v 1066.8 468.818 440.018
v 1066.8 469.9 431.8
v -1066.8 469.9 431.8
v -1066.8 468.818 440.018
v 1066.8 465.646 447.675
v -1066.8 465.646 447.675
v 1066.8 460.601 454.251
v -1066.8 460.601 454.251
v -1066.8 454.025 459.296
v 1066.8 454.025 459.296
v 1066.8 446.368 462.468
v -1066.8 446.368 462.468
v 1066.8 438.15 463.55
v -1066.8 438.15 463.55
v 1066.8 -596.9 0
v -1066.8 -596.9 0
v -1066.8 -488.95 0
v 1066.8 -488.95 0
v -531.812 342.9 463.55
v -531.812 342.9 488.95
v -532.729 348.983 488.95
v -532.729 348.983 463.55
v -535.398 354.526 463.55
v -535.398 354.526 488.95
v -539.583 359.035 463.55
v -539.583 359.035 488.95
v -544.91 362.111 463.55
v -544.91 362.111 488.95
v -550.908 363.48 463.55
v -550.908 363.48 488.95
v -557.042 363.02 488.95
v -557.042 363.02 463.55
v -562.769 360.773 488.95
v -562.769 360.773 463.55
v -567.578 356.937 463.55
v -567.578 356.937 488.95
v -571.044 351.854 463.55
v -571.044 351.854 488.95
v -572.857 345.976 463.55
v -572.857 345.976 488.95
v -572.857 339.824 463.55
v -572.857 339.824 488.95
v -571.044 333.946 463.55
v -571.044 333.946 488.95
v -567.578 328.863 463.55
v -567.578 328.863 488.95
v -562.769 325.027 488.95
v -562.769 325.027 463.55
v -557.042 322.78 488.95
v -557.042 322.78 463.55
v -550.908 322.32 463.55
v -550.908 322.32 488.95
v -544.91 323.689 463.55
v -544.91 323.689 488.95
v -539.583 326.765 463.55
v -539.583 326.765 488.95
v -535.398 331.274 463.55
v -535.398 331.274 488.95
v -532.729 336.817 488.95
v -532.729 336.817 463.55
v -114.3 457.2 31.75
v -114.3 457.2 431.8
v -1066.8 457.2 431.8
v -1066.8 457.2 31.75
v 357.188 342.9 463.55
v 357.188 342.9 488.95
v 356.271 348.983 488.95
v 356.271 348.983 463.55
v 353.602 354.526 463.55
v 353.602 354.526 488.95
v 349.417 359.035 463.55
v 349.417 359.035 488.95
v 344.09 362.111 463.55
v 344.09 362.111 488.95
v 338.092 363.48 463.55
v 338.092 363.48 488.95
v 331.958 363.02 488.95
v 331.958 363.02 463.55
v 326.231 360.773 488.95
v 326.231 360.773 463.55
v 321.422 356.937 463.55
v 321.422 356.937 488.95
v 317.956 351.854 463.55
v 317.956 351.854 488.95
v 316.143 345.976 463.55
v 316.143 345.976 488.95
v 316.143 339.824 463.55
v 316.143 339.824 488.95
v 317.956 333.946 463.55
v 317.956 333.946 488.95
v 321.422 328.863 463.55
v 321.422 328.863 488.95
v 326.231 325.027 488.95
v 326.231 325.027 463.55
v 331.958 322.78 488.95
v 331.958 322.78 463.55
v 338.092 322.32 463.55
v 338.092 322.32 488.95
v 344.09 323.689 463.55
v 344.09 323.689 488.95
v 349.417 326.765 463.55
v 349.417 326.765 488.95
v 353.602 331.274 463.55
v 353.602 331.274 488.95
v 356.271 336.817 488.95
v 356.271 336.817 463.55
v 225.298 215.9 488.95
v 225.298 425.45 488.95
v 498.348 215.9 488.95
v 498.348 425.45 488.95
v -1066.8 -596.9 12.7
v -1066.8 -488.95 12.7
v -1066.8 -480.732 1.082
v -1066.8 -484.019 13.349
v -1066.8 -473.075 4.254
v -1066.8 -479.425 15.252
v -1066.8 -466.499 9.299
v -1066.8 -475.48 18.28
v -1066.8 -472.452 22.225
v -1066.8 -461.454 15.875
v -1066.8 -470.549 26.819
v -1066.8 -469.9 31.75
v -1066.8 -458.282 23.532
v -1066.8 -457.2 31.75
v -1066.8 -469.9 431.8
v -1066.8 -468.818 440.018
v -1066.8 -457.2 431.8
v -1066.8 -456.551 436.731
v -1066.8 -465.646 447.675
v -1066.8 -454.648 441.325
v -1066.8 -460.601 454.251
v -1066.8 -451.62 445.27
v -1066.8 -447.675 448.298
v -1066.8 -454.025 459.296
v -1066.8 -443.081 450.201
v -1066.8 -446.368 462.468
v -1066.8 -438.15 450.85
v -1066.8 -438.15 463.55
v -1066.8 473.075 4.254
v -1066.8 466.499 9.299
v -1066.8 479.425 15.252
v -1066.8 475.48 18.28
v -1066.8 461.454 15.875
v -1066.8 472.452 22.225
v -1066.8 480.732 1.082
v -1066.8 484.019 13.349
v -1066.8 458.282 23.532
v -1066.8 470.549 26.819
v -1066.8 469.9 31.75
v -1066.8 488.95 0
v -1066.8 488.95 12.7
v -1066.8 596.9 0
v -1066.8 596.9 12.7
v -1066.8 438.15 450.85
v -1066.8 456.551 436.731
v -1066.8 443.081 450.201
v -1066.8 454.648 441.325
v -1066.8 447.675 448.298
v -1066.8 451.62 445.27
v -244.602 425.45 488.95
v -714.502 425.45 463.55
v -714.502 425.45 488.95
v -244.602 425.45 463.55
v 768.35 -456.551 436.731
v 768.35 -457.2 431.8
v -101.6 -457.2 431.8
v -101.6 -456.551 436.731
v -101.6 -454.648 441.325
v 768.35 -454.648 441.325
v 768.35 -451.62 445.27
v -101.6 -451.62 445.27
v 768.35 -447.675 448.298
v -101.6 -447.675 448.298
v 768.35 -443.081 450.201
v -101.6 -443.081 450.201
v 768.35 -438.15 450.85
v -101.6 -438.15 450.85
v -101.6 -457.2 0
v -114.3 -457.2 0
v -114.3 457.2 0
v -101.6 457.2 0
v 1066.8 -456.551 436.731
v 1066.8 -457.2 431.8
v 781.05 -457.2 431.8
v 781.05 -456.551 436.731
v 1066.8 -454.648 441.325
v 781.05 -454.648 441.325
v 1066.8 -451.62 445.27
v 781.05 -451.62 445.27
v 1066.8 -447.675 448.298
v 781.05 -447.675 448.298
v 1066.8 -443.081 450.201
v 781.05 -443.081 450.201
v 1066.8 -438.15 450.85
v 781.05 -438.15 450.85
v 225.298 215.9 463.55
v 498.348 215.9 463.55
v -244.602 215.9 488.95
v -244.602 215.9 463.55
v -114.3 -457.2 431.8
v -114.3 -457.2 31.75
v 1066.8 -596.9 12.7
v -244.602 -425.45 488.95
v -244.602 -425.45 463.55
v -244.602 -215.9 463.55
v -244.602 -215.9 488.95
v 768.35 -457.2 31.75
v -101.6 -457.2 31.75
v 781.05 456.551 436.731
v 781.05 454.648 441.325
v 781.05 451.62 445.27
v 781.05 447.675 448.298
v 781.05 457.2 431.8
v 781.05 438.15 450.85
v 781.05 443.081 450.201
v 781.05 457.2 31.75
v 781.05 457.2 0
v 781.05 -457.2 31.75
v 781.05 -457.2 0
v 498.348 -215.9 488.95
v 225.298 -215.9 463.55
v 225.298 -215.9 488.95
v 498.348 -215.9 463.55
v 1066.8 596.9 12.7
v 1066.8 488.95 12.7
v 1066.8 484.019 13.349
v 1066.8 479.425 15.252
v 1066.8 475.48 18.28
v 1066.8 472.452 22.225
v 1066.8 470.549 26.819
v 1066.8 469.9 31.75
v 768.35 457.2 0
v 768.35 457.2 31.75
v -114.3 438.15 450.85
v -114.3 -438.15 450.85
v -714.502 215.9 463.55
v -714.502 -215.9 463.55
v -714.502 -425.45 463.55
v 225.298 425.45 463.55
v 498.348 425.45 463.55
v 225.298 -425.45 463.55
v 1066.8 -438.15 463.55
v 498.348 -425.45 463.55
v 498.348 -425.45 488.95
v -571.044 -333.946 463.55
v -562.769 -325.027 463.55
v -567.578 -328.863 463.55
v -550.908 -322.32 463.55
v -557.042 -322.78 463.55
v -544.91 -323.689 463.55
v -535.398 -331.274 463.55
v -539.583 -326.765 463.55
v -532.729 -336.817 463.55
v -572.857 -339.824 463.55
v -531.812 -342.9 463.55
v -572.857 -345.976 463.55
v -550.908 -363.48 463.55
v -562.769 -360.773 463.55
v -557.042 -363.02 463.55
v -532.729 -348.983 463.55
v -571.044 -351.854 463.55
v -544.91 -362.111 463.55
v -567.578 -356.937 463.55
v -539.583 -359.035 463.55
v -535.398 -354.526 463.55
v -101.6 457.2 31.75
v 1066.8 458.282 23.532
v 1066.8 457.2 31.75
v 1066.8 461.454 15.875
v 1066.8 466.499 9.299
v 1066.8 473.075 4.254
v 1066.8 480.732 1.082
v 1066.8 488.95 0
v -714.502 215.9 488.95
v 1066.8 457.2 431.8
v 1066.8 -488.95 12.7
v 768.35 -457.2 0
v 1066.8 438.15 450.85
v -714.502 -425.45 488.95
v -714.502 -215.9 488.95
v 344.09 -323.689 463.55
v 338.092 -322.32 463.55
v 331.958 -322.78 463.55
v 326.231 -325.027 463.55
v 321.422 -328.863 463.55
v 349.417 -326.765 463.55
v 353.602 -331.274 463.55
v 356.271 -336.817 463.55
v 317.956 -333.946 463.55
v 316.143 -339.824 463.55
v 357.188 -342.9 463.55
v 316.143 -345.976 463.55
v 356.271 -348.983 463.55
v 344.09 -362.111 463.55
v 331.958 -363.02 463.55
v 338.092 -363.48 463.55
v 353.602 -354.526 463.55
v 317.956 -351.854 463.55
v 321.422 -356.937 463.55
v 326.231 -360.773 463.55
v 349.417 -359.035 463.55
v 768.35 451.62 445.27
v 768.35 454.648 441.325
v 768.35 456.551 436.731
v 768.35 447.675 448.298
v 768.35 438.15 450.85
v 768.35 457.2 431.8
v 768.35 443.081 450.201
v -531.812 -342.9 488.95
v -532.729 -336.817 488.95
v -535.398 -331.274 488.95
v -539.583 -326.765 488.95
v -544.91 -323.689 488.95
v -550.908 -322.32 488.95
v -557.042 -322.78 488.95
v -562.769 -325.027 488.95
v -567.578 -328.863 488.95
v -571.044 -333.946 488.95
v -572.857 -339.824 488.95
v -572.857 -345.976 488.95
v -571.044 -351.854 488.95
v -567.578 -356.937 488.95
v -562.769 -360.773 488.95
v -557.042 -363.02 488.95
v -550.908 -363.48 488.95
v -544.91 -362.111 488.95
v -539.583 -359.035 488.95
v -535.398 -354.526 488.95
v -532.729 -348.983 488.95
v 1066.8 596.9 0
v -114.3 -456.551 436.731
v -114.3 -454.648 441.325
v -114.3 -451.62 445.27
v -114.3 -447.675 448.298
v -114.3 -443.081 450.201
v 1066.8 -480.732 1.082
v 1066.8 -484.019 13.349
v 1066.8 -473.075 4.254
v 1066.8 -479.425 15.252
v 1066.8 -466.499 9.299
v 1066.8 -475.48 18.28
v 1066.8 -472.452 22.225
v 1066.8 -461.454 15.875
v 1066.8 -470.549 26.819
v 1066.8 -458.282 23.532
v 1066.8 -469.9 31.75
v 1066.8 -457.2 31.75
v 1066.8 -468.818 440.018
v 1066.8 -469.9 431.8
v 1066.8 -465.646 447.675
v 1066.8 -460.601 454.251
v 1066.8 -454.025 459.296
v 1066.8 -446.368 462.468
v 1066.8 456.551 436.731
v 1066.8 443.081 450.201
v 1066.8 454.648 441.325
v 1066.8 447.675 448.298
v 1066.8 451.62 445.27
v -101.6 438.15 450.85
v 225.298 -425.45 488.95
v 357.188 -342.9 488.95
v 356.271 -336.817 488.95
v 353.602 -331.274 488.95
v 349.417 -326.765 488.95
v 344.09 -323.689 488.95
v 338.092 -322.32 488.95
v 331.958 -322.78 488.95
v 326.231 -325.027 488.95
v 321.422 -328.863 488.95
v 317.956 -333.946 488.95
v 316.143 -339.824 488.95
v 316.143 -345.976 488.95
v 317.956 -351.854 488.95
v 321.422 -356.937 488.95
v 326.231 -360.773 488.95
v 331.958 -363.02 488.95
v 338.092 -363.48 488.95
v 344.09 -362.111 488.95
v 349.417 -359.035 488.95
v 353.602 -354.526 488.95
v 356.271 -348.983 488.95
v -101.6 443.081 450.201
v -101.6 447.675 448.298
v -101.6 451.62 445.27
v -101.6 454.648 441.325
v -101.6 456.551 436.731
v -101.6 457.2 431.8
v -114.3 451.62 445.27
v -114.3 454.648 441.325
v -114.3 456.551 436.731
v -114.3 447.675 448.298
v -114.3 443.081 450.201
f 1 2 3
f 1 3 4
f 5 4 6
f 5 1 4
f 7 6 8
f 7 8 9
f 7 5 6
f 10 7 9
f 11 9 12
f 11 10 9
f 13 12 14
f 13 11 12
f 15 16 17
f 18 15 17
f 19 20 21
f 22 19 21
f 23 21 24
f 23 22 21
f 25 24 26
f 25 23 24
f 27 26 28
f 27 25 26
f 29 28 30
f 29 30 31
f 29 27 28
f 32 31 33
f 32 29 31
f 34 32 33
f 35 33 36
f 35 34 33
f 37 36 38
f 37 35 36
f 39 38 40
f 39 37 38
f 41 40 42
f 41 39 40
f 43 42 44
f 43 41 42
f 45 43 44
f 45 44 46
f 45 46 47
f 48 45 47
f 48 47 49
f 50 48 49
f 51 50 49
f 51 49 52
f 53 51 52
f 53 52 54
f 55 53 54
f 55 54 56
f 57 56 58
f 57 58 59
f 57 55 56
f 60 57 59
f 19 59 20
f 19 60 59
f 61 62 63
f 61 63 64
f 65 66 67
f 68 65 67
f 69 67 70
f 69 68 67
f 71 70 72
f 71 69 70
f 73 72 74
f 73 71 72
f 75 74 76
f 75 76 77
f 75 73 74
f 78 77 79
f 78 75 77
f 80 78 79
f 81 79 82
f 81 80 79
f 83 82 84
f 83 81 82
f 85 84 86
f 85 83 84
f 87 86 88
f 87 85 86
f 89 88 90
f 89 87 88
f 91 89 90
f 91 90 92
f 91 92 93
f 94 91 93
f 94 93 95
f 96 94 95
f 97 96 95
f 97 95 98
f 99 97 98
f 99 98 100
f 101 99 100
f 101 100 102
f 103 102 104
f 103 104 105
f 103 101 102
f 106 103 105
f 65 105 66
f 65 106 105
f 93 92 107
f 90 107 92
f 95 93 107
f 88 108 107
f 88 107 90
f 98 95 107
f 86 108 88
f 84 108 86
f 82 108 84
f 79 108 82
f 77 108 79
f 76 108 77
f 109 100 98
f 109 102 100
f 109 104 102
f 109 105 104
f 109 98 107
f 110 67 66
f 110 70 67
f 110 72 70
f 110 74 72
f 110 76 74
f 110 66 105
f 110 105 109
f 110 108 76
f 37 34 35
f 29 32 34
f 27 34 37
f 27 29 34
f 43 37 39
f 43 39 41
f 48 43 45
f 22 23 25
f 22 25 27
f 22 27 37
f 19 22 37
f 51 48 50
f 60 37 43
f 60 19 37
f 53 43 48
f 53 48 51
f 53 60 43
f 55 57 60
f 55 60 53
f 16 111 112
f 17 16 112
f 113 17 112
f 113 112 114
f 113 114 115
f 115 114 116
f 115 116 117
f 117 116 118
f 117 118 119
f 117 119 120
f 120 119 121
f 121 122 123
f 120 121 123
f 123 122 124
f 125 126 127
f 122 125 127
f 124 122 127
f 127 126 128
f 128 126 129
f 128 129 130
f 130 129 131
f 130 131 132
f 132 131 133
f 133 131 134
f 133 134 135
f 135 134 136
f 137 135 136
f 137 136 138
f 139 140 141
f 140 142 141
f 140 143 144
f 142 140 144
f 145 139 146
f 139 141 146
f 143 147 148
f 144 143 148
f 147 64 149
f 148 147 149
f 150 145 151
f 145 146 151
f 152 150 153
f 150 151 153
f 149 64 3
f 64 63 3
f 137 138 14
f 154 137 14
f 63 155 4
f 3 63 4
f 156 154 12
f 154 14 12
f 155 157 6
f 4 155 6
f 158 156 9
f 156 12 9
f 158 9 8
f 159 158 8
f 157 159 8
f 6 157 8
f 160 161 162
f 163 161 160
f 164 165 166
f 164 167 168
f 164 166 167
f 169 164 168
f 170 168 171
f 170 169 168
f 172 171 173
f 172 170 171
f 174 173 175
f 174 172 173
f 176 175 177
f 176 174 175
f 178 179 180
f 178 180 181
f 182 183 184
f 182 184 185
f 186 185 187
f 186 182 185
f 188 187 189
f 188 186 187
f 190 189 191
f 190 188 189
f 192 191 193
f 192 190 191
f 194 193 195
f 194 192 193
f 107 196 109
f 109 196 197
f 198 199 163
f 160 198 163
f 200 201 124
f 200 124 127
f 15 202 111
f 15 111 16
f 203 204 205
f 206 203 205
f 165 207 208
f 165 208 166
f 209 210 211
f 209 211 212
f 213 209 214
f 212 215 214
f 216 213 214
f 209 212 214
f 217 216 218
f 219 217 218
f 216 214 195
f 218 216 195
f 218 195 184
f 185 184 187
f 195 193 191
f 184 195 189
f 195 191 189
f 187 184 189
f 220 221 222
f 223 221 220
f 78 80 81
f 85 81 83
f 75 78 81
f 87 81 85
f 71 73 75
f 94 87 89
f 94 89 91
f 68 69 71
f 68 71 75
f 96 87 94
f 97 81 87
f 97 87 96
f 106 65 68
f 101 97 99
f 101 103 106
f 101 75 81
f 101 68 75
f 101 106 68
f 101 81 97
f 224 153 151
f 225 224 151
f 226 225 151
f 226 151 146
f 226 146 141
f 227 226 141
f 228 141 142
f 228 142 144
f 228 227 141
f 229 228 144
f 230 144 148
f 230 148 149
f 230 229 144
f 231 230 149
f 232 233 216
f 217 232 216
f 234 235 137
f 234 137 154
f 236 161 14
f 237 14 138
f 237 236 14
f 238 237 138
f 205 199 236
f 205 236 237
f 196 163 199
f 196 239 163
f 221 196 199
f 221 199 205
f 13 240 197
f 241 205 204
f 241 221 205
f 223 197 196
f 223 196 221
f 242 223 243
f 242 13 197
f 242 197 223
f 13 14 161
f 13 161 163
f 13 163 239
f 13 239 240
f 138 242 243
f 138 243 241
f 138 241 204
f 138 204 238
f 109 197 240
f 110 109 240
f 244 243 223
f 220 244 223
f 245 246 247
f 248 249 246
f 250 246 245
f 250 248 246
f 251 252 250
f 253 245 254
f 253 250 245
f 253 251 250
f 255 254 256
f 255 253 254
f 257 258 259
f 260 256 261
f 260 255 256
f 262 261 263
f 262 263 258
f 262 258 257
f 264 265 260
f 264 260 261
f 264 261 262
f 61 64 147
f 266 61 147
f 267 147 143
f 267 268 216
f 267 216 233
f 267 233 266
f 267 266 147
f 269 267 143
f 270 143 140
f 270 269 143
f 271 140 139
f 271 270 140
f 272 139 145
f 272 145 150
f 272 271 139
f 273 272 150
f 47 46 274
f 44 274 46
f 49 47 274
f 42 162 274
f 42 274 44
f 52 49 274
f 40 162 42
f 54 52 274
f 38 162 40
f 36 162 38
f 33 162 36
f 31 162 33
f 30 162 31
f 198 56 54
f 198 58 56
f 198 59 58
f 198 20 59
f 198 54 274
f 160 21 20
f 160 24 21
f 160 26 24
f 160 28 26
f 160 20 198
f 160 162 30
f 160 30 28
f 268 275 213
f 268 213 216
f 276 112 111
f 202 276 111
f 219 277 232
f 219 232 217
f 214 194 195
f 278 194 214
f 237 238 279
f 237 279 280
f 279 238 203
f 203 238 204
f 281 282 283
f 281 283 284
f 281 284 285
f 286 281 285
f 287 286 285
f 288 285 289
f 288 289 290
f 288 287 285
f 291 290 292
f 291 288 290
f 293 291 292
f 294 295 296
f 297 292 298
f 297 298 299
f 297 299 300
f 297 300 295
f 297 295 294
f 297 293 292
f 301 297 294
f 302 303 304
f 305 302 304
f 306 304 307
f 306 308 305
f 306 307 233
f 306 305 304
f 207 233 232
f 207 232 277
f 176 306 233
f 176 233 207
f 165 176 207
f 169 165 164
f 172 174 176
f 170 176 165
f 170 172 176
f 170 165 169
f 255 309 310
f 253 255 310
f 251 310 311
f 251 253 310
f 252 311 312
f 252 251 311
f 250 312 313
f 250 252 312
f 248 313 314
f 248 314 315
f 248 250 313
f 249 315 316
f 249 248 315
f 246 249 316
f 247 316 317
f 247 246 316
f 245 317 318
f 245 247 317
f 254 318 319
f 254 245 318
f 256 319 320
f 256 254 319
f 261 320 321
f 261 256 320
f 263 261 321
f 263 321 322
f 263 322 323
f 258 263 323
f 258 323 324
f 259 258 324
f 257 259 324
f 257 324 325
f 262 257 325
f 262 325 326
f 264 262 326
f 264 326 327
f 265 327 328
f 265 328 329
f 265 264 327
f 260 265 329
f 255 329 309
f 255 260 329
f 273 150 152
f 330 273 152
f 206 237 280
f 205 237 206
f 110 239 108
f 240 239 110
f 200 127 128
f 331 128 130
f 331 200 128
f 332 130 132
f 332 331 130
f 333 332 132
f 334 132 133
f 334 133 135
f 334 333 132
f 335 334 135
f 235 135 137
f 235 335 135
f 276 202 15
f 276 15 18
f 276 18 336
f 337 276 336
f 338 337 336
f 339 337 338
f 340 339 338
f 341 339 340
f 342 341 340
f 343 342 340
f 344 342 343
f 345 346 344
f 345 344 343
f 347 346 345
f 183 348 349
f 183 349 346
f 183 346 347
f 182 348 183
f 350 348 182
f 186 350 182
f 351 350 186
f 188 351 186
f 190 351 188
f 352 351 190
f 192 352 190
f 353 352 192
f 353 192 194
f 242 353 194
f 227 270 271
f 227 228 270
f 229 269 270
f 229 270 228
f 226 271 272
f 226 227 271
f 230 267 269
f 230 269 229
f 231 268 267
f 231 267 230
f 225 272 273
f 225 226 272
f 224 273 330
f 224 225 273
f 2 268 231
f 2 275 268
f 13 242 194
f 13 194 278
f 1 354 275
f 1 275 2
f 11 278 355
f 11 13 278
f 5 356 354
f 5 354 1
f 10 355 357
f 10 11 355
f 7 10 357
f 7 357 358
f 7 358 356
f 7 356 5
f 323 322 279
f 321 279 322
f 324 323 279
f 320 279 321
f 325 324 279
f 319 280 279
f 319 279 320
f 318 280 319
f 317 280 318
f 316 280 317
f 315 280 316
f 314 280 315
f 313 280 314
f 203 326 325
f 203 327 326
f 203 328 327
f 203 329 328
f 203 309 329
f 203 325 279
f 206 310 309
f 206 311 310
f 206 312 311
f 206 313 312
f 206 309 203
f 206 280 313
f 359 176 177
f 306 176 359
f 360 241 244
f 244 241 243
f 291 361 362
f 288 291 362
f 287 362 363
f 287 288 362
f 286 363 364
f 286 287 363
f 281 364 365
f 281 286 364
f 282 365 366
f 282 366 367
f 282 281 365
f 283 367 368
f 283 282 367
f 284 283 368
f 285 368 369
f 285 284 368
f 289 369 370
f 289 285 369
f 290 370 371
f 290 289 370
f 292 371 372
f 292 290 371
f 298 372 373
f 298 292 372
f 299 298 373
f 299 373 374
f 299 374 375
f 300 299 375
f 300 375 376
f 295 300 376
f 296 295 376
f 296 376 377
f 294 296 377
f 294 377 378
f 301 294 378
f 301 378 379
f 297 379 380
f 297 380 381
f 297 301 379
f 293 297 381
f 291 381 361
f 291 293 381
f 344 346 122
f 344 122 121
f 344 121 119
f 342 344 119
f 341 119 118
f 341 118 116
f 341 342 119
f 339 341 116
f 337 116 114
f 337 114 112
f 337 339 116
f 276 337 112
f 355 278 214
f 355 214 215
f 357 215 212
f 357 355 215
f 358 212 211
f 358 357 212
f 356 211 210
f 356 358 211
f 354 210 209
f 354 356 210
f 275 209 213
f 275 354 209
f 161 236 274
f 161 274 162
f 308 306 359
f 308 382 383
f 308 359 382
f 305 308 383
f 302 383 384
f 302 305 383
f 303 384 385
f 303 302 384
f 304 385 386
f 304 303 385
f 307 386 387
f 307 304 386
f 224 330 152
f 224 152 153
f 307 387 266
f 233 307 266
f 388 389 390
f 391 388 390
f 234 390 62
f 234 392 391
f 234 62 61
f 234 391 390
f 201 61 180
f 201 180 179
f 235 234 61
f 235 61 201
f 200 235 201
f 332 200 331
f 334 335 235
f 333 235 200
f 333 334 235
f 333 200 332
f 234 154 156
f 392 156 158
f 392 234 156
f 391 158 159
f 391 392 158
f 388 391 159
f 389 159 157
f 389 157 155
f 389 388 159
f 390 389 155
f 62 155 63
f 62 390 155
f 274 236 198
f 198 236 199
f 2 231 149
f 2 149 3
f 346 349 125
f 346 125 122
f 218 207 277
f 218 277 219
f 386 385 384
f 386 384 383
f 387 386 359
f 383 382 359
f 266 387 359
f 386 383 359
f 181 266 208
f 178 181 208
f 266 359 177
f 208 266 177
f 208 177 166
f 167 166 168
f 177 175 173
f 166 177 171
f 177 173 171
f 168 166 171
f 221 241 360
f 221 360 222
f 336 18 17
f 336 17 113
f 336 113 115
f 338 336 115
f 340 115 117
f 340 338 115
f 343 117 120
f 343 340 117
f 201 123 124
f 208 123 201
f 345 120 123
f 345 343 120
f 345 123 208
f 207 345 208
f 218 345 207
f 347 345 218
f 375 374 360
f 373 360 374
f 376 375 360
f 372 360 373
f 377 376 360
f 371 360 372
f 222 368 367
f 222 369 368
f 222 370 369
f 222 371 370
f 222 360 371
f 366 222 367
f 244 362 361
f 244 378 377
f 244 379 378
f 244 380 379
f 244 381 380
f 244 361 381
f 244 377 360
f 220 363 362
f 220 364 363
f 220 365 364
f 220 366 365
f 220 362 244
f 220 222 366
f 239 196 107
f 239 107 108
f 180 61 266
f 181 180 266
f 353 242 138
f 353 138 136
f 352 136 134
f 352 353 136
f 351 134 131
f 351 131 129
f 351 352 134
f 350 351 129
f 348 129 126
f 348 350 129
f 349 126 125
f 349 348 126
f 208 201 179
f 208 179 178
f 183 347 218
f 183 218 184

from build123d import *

# Parameters (mm, degrees)
F1_DEPTH = 1066.8
F2_W     = 12.7
F2_H     = 914.4
F3_DEPTH = 450.85
F4_W     = 469.9
F4_H     = 209.55
F4_R     = 20.6375
F4_W_2   = 273.05
F5_DEPTH = 25.4


with BuildPart() as f1:
    # F0 (on Right) → F1 (new body, symmetric)
    with BuildSketch(Plane.YZ):
        with BuildLine():
            ThreePointArc((457.2, 31.75), (466.49936, 9.29936), (488.95, 0))
            Line((488.95, 0), (596.9, 0))
            Line((596.9, 0), (596.9, 12.7))
            Line((596.9, 12.7), (488.95, 12.7))
            ThreePointArc((488.95, 12.7), (475.479616, 18.279616), (469.9, 31.75))
            Line((469.9, 31.75), (469.9, 431.8))
            ThreePointArc((469.9, 431.8), (460.60064, 454.25064), (438.15, 463.55))
            Line((438.15, 463.55), (0, 463.55))
            Line((0, 463.55), (-438.15, 463.55))
            ThreePointArc((-438.15, 463.55), (-460.60064, 454.25064), (-469.9, 431.8))
            Line((-469.9, 431.8), (-469.9, 31.75))
            ThreePointArc((-469.9, 31.75), (-475.479616, 18.279616), (-488.95, 12.7))
            Line((-488.95, 12.7), (-596.9, 12.7))
            Line((-596.9, 12.7), (-596.9, 0))
            Line((-596.9, 0), (-488.95, 0))
            ThreePointArc((-488.95, 0), (-466.49936, 9.29936), (-457.2, 31.75))
            Line((-457.2, 31.75), (-457.2, 431.8))
            ThreePointArc((-457.2, 431.8), (-451.620384, 445.270384), (-438.15, 450.85))
            Line((-438.15, 450.85), (0, 450.85))
            Line((0, 450.85), (438.15, 450.85))
            ThreePointArc((438.15, 450.85), (451.620384, 445.270384), (457.2, 431.8))
            Line((457.2, 431.8), (457.2, 31.75))
        make_face()
    extrude(amount=F1_DEPTH, both=True)

    # F2 (on face) → F3 (join, through all)
    with BuildSketch(Plane(origin=(0, 0, 450.85), x_dir=(1, 0, 0), z_dir=(0, 0, -1))):
        with Locations((-107.95, 0)):
            Rectangle(F2_W, F2_H)
        with Locations((774.7, 0)):
            Rectangle(F2_W, F2_H)
    extrude(amount=F3_DEPTH)

    # F4 (on face) → F5 (join)
    with BuildSketch(Plane.XY.offset(463.55)):
        with Locations((-479.552, 320.675)):
            Rectangle(F4_W, F4_H)
        with Locations((-552.45, 342.9)):
            Circle(F4_R, mode=Mode.SUBTRACT)
        with Locations((361.823, 320.675)):
            Rectangle(F4_W_2, F4_H)
        with Locations((336.55, 342.9)):
            Circle(F4_R, mode=Mode.SUBTRACT)
        with Locations((361.823, -320.675)):
            Rectangle(F4_W_2, F4_H)
        with Locations((336.55, -342.9)):
            Circle(F4_R, mode=Mode.SUBTRACT)
        with Locations((-479.552, -320.675)):
            Rectangle(F4_W, F4_H)
        with Locations((-552.45, -342.9)):
            Circle(F4_R, mode=Mode.SUBTRACT)
    extrude(amount=F5_DEPTH)


solid = f1.part
